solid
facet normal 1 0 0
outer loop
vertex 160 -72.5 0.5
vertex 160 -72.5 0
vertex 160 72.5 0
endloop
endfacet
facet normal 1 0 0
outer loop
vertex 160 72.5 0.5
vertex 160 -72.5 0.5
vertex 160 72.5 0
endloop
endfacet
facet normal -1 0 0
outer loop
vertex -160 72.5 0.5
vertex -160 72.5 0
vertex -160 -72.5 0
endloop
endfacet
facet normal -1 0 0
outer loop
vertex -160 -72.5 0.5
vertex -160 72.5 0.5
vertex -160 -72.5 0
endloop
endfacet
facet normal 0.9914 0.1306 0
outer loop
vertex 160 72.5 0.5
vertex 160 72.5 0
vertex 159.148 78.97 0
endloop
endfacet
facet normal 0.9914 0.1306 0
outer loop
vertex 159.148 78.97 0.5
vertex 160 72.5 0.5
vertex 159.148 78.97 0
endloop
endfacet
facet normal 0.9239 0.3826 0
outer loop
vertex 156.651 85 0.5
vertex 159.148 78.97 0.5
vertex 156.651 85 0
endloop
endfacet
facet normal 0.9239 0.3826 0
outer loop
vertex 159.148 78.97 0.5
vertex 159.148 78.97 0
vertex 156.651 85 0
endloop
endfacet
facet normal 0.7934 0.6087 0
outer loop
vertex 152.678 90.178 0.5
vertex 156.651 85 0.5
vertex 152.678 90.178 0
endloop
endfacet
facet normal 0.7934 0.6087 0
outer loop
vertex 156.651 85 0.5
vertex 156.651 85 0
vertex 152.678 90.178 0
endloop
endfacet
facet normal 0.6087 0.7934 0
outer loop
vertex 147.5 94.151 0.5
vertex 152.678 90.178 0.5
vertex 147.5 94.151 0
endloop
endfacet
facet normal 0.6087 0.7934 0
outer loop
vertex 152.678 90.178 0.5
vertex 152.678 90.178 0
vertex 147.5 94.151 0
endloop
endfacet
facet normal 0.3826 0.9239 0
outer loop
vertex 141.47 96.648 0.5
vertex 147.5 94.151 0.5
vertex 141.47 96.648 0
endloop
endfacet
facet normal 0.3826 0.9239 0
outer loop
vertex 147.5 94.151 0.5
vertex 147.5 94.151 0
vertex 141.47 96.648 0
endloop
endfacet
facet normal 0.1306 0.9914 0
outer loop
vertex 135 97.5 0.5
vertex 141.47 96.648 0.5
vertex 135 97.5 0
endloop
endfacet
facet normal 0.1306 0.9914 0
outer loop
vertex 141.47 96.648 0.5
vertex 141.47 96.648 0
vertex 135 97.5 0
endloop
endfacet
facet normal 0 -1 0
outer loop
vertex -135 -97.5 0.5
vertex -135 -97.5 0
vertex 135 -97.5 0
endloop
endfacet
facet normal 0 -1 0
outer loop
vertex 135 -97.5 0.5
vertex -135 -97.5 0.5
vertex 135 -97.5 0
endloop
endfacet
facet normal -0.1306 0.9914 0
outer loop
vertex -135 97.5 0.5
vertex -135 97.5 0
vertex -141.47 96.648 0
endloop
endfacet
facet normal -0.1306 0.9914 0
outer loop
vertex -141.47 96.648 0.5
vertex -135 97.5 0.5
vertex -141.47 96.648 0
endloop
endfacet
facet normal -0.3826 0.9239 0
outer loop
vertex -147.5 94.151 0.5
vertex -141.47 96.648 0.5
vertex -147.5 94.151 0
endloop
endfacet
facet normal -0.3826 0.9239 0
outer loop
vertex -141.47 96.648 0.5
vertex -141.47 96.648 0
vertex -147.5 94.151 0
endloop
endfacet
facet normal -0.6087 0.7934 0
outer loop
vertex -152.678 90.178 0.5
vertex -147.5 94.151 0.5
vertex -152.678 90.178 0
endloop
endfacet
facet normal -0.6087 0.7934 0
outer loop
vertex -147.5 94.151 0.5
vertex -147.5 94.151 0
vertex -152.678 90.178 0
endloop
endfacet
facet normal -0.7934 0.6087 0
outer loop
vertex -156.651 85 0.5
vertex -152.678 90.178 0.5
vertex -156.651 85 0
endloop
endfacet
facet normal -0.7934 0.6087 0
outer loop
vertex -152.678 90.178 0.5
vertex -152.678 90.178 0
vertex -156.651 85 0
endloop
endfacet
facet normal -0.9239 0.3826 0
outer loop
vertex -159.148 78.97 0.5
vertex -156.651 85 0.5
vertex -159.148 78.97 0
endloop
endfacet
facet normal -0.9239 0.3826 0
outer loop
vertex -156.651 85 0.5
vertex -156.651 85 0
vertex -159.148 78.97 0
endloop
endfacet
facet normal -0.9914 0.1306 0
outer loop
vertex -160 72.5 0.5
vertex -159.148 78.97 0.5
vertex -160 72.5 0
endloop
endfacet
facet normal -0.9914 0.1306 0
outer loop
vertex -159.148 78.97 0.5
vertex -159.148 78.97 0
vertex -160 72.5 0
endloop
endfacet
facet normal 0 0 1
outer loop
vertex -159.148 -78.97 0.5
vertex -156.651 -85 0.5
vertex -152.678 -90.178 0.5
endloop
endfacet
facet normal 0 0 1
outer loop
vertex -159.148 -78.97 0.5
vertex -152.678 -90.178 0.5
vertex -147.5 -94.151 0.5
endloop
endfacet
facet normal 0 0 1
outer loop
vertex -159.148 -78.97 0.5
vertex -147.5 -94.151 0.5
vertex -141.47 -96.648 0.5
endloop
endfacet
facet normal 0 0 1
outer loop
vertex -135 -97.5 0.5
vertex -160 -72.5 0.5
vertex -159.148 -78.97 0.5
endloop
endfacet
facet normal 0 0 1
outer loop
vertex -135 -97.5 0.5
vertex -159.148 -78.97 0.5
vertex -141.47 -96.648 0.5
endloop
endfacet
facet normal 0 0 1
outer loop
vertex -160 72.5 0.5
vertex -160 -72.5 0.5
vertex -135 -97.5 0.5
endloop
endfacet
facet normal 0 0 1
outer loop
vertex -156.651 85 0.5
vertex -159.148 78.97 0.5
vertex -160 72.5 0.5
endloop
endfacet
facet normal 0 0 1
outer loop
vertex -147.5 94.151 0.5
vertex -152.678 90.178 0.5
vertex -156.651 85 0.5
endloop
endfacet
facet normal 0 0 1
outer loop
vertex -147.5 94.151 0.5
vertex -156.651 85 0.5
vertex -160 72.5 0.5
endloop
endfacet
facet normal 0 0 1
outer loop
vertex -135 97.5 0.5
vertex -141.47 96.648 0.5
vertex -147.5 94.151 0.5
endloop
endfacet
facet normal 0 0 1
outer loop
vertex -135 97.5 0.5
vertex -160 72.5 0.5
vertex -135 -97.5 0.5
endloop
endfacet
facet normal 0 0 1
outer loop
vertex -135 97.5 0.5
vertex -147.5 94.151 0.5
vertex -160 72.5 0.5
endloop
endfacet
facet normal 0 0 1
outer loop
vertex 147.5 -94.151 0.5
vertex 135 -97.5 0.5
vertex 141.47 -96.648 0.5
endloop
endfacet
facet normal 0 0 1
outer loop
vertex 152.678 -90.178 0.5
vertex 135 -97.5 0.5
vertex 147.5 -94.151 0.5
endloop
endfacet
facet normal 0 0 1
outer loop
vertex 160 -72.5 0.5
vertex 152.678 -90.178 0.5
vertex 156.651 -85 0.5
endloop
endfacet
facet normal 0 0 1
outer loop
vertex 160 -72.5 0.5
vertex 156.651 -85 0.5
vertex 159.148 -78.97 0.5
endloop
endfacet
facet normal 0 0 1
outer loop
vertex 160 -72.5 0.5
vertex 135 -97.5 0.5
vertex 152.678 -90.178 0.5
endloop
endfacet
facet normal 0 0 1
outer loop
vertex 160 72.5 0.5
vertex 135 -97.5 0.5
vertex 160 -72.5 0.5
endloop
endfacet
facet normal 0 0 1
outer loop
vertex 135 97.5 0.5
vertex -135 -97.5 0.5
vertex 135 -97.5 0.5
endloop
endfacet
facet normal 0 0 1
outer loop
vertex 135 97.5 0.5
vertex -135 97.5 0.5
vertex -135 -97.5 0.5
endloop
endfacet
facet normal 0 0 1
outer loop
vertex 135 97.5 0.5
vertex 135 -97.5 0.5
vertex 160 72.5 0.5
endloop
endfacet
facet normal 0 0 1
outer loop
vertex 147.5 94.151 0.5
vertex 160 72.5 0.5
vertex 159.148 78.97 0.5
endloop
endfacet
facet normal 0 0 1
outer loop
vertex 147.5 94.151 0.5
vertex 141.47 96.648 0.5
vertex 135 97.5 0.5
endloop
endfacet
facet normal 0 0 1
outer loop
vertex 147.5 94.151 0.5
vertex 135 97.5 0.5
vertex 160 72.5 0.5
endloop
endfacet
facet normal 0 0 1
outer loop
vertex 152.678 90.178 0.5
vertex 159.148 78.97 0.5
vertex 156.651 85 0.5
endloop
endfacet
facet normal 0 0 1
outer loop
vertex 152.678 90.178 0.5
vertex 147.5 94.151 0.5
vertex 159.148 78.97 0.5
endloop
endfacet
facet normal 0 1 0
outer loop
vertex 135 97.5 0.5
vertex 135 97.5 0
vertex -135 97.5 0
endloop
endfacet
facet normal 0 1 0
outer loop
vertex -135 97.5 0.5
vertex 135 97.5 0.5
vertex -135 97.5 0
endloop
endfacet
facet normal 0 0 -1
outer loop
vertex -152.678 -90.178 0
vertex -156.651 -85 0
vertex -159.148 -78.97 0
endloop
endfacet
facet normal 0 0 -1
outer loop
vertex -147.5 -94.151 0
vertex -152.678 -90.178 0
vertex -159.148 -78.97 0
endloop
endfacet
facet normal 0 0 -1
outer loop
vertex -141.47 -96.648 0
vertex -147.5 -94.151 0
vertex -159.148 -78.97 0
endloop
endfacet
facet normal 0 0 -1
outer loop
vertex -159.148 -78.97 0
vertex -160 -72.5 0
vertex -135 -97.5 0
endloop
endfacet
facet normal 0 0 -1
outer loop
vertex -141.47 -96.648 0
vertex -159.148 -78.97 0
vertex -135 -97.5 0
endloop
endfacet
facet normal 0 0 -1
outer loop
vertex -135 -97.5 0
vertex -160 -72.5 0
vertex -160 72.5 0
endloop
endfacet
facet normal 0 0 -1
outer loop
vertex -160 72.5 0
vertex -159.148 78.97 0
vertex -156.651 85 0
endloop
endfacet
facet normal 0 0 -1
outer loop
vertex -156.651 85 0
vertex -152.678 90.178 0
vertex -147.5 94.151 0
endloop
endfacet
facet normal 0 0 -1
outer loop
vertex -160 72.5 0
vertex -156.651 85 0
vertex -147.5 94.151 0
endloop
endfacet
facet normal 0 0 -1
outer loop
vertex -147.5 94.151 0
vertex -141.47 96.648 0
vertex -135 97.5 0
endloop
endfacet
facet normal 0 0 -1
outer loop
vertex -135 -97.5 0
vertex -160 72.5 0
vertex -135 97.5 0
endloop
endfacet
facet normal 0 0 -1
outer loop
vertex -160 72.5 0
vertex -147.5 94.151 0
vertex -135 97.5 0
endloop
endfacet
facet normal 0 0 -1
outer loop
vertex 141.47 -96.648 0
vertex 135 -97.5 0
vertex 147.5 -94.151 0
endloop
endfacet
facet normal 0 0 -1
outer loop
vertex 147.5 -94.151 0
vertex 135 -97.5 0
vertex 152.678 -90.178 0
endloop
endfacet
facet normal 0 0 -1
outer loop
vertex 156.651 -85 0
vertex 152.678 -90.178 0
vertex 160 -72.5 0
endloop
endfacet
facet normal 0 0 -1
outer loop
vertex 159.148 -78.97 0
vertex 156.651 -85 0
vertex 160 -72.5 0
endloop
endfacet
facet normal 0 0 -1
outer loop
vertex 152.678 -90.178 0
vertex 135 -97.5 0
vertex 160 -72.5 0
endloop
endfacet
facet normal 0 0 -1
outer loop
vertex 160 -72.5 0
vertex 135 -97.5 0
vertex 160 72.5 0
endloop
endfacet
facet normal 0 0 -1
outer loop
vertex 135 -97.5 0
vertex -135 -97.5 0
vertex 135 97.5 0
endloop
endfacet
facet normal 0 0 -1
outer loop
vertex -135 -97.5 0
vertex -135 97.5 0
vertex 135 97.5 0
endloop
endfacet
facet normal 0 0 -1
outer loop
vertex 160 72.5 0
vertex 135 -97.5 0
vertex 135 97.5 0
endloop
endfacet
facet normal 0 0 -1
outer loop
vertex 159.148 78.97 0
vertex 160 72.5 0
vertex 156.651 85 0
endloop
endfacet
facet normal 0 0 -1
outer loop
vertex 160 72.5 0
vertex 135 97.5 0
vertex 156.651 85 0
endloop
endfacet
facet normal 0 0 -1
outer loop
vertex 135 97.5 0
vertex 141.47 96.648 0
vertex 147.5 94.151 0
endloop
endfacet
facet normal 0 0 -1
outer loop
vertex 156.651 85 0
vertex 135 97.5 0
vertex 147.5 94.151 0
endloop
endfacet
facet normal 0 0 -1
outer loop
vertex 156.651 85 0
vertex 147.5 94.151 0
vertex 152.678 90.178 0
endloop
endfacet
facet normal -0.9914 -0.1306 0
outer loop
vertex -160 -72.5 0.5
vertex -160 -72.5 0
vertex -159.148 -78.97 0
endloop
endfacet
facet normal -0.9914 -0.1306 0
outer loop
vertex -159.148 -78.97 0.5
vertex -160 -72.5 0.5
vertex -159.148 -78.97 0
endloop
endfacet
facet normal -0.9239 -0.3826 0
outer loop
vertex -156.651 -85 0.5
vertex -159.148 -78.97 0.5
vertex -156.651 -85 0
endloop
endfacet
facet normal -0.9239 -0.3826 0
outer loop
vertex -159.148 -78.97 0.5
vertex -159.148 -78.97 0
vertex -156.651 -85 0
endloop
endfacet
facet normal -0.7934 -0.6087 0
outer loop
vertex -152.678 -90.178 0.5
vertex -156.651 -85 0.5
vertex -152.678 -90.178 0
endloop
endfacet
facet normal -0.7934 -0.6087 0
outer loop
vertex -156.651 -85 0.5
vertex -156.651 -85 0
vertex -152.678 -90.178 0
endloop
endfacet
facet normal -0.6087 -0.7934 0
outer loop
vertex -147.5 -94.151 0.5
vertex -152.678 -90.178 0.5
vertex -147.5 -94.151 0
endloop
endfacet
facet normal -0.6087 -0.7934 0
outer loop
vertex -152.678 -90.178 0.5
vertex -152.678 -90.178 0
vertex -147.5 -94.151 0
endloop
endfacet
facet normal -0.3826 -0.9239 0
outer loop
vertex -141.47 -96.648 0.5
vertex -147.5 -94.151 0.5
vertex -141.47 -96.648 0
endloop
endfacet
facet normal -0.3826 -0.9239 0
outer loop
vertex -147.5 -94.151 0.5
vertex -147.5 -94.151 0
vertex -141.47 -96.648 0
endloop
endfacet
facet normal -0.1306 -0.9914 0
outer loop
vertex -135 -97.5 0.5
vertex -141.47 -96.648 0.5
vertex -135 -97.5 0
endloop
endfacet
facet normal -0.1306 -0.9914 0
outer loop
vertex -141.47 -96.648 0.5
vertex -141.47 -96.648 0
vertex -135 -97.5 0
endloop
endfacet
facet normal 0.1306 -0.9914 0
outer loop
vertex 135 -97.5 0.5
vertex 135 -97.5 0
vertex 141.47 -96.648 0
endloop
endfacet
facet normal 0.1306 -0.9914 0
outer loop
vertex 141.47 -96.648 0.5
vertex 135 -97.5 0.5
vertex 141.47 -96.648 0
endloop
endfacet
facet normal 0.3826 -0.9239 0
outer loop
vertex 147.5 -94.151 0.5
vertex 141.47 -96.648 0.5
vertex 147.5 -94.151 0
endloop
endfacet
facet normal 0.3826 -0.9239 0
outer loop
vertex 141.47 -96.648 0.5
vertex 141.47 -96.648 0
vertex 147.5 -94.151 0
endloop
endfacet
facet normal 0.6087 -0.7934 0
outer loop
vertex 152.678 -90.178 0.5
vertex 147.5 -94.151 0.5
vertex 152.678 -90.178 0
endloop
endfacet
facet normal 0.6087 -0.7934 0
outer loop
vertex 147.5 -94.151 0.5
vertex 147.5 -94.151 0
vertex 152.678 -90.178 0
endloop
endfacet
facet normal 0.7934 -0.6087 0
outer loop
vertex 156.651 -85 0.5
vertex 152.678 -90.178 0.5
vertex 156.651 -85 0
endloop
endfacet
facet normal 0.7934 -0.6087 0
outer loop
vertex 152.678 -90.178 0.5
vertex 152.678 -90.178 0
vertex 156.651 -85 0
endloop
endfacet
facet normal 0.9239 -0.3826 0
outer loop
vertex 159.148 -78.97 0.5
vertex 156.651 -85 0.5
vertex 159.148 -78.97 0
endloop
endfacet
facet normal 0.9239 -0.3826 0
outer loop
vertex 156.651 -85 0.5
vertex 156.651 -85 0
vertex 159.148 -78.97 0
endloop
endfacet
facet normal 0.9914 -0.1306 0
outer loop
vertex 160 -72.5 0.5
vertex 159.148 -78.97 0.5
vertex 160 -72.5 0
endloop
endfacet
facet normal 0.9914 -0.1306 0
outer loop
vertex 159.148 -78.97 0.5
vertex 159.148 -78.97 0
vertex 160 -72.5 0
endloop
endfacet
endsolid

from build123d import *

# Parameters (mm, degrees)
BOSS_EXTRUDE1_DEPTH = 0.5
FILLET1_R           = 20
FILLET2_R           = 5
SKETCH5_W           = 85
SKETCH5_H           = 69.5
CUT_EXTRUDE1_DEPTH  = 98.5000001


with BuildPart() as part:
    # Sketch1 → Boss-Extrude1 (new body)
    with BuildSketch(Plane.XY):
        with BuildLine():
            Line((-135, -97.5), (135, -97.5))
            ThreePointArc((135, -97.5), (152.67766953, -90.17766953), (160, -72.5))
            Line((160, -72.5), (160, 72.5))
            ThreePointArc((160, 72.5), (152.67766953, 90.17766953), (135, 97.5))
            Line((135, 97.5), (-135, 97.5))
            ThreePointArc((-135, 97.5), (-152.67766953, 90.17766953), (-160, 72.5))
            Line((-160, 72.5), (-160, -72.5))
            ThreePointArc((-160, -72.5), (-152.67766953, -90.17766953), (-135, -97.5))
        make_face()
    extrude(amount=BOSS_EXTRUDE1_DEPTH)

    # Sketch3 → Loft1 section 0
    with BuildSketch(Plane(origin=(0, 0, 0), x_dir=(-1, 0, 0), z_dir=(0, 0, -1))):
        with BuildLine():
            Line((-135, -97.5), (-75, -97.5))
            Line((-75, -97.5), (-75, -37.5))
            ThreePointArc((-75, -37.5), (-82.32233047, -19.82233047), (-100, -12.5))
            Line((-100, -12.5), (-160, -12.5))
            Line((-160, -12.5), (-160, -72.5))
            ThreePointArc((-160, -72.5), (-152.67766953, -90.17766953), (-135, -97.5))
        make_face()
    # Sketch4 → Loft1 section 1
    with BuildSketch(Plane.XY.offset(-69.5)):
        with BuildLine():
            Line((153, -72.5), (153, -19.5))
            Line((153, -19.5), (100, -19.5))
            ThreePointArc((100, -19.5), (87.272077939, -24.772077939), (82, -37.5))
            Line((82, -37.5), (82, -90.5))
            Line((82, -90.5), (135, -90.5))
            ThreePointArc((135, -90.5), (147.727922061, -85.227922061), (153, -72.5))
        make_face()
    loft()

    # Fillet1
    fillet1_edges = [part.edges().sort_by_distance(p)[0] for p in [
        (82, -64, -69.5),
        (126.5, -19.5, -69.5),
    ]]
    fillet(fillet1_edges, radius=FILLET1_R)

    # Fillet2
    fillet2_edges = [part.edges().sort_by_distance(p)[0] for p in [
        (77.593739129, -94.906260871, -25.75212421),
        (86.655220253, -91.021861498, -64.318660839),
        (117.543397663, -90.5, -69.5),
        (153, -55.043320694, -69.5),
        (147.727922061, -85.227922061, -69.5),
        (153.521863591, -24.155150727, -64.318640061),
        (157.406260281, -15.093739719, -25.752130071),
    ]]
    fillet(fillet2_edges, radius=FILLET2_R)

    # Sketch5 → Cut-Extrude1 (cut, through all)
    with BuildSketch(Plane(origin=(0, 0, 0), x_dir=(1, 0, 0), z_dir=(0, 1, 0))):
        with Locations((117.5, 34.75)):
            Rectangle(SKETCH5_W, SKETCH5_H)
    extrude(amount=-CUT_EXTRUDE1_DEPTH, mode=Mode.SUBTRACT)


solid = part.part
